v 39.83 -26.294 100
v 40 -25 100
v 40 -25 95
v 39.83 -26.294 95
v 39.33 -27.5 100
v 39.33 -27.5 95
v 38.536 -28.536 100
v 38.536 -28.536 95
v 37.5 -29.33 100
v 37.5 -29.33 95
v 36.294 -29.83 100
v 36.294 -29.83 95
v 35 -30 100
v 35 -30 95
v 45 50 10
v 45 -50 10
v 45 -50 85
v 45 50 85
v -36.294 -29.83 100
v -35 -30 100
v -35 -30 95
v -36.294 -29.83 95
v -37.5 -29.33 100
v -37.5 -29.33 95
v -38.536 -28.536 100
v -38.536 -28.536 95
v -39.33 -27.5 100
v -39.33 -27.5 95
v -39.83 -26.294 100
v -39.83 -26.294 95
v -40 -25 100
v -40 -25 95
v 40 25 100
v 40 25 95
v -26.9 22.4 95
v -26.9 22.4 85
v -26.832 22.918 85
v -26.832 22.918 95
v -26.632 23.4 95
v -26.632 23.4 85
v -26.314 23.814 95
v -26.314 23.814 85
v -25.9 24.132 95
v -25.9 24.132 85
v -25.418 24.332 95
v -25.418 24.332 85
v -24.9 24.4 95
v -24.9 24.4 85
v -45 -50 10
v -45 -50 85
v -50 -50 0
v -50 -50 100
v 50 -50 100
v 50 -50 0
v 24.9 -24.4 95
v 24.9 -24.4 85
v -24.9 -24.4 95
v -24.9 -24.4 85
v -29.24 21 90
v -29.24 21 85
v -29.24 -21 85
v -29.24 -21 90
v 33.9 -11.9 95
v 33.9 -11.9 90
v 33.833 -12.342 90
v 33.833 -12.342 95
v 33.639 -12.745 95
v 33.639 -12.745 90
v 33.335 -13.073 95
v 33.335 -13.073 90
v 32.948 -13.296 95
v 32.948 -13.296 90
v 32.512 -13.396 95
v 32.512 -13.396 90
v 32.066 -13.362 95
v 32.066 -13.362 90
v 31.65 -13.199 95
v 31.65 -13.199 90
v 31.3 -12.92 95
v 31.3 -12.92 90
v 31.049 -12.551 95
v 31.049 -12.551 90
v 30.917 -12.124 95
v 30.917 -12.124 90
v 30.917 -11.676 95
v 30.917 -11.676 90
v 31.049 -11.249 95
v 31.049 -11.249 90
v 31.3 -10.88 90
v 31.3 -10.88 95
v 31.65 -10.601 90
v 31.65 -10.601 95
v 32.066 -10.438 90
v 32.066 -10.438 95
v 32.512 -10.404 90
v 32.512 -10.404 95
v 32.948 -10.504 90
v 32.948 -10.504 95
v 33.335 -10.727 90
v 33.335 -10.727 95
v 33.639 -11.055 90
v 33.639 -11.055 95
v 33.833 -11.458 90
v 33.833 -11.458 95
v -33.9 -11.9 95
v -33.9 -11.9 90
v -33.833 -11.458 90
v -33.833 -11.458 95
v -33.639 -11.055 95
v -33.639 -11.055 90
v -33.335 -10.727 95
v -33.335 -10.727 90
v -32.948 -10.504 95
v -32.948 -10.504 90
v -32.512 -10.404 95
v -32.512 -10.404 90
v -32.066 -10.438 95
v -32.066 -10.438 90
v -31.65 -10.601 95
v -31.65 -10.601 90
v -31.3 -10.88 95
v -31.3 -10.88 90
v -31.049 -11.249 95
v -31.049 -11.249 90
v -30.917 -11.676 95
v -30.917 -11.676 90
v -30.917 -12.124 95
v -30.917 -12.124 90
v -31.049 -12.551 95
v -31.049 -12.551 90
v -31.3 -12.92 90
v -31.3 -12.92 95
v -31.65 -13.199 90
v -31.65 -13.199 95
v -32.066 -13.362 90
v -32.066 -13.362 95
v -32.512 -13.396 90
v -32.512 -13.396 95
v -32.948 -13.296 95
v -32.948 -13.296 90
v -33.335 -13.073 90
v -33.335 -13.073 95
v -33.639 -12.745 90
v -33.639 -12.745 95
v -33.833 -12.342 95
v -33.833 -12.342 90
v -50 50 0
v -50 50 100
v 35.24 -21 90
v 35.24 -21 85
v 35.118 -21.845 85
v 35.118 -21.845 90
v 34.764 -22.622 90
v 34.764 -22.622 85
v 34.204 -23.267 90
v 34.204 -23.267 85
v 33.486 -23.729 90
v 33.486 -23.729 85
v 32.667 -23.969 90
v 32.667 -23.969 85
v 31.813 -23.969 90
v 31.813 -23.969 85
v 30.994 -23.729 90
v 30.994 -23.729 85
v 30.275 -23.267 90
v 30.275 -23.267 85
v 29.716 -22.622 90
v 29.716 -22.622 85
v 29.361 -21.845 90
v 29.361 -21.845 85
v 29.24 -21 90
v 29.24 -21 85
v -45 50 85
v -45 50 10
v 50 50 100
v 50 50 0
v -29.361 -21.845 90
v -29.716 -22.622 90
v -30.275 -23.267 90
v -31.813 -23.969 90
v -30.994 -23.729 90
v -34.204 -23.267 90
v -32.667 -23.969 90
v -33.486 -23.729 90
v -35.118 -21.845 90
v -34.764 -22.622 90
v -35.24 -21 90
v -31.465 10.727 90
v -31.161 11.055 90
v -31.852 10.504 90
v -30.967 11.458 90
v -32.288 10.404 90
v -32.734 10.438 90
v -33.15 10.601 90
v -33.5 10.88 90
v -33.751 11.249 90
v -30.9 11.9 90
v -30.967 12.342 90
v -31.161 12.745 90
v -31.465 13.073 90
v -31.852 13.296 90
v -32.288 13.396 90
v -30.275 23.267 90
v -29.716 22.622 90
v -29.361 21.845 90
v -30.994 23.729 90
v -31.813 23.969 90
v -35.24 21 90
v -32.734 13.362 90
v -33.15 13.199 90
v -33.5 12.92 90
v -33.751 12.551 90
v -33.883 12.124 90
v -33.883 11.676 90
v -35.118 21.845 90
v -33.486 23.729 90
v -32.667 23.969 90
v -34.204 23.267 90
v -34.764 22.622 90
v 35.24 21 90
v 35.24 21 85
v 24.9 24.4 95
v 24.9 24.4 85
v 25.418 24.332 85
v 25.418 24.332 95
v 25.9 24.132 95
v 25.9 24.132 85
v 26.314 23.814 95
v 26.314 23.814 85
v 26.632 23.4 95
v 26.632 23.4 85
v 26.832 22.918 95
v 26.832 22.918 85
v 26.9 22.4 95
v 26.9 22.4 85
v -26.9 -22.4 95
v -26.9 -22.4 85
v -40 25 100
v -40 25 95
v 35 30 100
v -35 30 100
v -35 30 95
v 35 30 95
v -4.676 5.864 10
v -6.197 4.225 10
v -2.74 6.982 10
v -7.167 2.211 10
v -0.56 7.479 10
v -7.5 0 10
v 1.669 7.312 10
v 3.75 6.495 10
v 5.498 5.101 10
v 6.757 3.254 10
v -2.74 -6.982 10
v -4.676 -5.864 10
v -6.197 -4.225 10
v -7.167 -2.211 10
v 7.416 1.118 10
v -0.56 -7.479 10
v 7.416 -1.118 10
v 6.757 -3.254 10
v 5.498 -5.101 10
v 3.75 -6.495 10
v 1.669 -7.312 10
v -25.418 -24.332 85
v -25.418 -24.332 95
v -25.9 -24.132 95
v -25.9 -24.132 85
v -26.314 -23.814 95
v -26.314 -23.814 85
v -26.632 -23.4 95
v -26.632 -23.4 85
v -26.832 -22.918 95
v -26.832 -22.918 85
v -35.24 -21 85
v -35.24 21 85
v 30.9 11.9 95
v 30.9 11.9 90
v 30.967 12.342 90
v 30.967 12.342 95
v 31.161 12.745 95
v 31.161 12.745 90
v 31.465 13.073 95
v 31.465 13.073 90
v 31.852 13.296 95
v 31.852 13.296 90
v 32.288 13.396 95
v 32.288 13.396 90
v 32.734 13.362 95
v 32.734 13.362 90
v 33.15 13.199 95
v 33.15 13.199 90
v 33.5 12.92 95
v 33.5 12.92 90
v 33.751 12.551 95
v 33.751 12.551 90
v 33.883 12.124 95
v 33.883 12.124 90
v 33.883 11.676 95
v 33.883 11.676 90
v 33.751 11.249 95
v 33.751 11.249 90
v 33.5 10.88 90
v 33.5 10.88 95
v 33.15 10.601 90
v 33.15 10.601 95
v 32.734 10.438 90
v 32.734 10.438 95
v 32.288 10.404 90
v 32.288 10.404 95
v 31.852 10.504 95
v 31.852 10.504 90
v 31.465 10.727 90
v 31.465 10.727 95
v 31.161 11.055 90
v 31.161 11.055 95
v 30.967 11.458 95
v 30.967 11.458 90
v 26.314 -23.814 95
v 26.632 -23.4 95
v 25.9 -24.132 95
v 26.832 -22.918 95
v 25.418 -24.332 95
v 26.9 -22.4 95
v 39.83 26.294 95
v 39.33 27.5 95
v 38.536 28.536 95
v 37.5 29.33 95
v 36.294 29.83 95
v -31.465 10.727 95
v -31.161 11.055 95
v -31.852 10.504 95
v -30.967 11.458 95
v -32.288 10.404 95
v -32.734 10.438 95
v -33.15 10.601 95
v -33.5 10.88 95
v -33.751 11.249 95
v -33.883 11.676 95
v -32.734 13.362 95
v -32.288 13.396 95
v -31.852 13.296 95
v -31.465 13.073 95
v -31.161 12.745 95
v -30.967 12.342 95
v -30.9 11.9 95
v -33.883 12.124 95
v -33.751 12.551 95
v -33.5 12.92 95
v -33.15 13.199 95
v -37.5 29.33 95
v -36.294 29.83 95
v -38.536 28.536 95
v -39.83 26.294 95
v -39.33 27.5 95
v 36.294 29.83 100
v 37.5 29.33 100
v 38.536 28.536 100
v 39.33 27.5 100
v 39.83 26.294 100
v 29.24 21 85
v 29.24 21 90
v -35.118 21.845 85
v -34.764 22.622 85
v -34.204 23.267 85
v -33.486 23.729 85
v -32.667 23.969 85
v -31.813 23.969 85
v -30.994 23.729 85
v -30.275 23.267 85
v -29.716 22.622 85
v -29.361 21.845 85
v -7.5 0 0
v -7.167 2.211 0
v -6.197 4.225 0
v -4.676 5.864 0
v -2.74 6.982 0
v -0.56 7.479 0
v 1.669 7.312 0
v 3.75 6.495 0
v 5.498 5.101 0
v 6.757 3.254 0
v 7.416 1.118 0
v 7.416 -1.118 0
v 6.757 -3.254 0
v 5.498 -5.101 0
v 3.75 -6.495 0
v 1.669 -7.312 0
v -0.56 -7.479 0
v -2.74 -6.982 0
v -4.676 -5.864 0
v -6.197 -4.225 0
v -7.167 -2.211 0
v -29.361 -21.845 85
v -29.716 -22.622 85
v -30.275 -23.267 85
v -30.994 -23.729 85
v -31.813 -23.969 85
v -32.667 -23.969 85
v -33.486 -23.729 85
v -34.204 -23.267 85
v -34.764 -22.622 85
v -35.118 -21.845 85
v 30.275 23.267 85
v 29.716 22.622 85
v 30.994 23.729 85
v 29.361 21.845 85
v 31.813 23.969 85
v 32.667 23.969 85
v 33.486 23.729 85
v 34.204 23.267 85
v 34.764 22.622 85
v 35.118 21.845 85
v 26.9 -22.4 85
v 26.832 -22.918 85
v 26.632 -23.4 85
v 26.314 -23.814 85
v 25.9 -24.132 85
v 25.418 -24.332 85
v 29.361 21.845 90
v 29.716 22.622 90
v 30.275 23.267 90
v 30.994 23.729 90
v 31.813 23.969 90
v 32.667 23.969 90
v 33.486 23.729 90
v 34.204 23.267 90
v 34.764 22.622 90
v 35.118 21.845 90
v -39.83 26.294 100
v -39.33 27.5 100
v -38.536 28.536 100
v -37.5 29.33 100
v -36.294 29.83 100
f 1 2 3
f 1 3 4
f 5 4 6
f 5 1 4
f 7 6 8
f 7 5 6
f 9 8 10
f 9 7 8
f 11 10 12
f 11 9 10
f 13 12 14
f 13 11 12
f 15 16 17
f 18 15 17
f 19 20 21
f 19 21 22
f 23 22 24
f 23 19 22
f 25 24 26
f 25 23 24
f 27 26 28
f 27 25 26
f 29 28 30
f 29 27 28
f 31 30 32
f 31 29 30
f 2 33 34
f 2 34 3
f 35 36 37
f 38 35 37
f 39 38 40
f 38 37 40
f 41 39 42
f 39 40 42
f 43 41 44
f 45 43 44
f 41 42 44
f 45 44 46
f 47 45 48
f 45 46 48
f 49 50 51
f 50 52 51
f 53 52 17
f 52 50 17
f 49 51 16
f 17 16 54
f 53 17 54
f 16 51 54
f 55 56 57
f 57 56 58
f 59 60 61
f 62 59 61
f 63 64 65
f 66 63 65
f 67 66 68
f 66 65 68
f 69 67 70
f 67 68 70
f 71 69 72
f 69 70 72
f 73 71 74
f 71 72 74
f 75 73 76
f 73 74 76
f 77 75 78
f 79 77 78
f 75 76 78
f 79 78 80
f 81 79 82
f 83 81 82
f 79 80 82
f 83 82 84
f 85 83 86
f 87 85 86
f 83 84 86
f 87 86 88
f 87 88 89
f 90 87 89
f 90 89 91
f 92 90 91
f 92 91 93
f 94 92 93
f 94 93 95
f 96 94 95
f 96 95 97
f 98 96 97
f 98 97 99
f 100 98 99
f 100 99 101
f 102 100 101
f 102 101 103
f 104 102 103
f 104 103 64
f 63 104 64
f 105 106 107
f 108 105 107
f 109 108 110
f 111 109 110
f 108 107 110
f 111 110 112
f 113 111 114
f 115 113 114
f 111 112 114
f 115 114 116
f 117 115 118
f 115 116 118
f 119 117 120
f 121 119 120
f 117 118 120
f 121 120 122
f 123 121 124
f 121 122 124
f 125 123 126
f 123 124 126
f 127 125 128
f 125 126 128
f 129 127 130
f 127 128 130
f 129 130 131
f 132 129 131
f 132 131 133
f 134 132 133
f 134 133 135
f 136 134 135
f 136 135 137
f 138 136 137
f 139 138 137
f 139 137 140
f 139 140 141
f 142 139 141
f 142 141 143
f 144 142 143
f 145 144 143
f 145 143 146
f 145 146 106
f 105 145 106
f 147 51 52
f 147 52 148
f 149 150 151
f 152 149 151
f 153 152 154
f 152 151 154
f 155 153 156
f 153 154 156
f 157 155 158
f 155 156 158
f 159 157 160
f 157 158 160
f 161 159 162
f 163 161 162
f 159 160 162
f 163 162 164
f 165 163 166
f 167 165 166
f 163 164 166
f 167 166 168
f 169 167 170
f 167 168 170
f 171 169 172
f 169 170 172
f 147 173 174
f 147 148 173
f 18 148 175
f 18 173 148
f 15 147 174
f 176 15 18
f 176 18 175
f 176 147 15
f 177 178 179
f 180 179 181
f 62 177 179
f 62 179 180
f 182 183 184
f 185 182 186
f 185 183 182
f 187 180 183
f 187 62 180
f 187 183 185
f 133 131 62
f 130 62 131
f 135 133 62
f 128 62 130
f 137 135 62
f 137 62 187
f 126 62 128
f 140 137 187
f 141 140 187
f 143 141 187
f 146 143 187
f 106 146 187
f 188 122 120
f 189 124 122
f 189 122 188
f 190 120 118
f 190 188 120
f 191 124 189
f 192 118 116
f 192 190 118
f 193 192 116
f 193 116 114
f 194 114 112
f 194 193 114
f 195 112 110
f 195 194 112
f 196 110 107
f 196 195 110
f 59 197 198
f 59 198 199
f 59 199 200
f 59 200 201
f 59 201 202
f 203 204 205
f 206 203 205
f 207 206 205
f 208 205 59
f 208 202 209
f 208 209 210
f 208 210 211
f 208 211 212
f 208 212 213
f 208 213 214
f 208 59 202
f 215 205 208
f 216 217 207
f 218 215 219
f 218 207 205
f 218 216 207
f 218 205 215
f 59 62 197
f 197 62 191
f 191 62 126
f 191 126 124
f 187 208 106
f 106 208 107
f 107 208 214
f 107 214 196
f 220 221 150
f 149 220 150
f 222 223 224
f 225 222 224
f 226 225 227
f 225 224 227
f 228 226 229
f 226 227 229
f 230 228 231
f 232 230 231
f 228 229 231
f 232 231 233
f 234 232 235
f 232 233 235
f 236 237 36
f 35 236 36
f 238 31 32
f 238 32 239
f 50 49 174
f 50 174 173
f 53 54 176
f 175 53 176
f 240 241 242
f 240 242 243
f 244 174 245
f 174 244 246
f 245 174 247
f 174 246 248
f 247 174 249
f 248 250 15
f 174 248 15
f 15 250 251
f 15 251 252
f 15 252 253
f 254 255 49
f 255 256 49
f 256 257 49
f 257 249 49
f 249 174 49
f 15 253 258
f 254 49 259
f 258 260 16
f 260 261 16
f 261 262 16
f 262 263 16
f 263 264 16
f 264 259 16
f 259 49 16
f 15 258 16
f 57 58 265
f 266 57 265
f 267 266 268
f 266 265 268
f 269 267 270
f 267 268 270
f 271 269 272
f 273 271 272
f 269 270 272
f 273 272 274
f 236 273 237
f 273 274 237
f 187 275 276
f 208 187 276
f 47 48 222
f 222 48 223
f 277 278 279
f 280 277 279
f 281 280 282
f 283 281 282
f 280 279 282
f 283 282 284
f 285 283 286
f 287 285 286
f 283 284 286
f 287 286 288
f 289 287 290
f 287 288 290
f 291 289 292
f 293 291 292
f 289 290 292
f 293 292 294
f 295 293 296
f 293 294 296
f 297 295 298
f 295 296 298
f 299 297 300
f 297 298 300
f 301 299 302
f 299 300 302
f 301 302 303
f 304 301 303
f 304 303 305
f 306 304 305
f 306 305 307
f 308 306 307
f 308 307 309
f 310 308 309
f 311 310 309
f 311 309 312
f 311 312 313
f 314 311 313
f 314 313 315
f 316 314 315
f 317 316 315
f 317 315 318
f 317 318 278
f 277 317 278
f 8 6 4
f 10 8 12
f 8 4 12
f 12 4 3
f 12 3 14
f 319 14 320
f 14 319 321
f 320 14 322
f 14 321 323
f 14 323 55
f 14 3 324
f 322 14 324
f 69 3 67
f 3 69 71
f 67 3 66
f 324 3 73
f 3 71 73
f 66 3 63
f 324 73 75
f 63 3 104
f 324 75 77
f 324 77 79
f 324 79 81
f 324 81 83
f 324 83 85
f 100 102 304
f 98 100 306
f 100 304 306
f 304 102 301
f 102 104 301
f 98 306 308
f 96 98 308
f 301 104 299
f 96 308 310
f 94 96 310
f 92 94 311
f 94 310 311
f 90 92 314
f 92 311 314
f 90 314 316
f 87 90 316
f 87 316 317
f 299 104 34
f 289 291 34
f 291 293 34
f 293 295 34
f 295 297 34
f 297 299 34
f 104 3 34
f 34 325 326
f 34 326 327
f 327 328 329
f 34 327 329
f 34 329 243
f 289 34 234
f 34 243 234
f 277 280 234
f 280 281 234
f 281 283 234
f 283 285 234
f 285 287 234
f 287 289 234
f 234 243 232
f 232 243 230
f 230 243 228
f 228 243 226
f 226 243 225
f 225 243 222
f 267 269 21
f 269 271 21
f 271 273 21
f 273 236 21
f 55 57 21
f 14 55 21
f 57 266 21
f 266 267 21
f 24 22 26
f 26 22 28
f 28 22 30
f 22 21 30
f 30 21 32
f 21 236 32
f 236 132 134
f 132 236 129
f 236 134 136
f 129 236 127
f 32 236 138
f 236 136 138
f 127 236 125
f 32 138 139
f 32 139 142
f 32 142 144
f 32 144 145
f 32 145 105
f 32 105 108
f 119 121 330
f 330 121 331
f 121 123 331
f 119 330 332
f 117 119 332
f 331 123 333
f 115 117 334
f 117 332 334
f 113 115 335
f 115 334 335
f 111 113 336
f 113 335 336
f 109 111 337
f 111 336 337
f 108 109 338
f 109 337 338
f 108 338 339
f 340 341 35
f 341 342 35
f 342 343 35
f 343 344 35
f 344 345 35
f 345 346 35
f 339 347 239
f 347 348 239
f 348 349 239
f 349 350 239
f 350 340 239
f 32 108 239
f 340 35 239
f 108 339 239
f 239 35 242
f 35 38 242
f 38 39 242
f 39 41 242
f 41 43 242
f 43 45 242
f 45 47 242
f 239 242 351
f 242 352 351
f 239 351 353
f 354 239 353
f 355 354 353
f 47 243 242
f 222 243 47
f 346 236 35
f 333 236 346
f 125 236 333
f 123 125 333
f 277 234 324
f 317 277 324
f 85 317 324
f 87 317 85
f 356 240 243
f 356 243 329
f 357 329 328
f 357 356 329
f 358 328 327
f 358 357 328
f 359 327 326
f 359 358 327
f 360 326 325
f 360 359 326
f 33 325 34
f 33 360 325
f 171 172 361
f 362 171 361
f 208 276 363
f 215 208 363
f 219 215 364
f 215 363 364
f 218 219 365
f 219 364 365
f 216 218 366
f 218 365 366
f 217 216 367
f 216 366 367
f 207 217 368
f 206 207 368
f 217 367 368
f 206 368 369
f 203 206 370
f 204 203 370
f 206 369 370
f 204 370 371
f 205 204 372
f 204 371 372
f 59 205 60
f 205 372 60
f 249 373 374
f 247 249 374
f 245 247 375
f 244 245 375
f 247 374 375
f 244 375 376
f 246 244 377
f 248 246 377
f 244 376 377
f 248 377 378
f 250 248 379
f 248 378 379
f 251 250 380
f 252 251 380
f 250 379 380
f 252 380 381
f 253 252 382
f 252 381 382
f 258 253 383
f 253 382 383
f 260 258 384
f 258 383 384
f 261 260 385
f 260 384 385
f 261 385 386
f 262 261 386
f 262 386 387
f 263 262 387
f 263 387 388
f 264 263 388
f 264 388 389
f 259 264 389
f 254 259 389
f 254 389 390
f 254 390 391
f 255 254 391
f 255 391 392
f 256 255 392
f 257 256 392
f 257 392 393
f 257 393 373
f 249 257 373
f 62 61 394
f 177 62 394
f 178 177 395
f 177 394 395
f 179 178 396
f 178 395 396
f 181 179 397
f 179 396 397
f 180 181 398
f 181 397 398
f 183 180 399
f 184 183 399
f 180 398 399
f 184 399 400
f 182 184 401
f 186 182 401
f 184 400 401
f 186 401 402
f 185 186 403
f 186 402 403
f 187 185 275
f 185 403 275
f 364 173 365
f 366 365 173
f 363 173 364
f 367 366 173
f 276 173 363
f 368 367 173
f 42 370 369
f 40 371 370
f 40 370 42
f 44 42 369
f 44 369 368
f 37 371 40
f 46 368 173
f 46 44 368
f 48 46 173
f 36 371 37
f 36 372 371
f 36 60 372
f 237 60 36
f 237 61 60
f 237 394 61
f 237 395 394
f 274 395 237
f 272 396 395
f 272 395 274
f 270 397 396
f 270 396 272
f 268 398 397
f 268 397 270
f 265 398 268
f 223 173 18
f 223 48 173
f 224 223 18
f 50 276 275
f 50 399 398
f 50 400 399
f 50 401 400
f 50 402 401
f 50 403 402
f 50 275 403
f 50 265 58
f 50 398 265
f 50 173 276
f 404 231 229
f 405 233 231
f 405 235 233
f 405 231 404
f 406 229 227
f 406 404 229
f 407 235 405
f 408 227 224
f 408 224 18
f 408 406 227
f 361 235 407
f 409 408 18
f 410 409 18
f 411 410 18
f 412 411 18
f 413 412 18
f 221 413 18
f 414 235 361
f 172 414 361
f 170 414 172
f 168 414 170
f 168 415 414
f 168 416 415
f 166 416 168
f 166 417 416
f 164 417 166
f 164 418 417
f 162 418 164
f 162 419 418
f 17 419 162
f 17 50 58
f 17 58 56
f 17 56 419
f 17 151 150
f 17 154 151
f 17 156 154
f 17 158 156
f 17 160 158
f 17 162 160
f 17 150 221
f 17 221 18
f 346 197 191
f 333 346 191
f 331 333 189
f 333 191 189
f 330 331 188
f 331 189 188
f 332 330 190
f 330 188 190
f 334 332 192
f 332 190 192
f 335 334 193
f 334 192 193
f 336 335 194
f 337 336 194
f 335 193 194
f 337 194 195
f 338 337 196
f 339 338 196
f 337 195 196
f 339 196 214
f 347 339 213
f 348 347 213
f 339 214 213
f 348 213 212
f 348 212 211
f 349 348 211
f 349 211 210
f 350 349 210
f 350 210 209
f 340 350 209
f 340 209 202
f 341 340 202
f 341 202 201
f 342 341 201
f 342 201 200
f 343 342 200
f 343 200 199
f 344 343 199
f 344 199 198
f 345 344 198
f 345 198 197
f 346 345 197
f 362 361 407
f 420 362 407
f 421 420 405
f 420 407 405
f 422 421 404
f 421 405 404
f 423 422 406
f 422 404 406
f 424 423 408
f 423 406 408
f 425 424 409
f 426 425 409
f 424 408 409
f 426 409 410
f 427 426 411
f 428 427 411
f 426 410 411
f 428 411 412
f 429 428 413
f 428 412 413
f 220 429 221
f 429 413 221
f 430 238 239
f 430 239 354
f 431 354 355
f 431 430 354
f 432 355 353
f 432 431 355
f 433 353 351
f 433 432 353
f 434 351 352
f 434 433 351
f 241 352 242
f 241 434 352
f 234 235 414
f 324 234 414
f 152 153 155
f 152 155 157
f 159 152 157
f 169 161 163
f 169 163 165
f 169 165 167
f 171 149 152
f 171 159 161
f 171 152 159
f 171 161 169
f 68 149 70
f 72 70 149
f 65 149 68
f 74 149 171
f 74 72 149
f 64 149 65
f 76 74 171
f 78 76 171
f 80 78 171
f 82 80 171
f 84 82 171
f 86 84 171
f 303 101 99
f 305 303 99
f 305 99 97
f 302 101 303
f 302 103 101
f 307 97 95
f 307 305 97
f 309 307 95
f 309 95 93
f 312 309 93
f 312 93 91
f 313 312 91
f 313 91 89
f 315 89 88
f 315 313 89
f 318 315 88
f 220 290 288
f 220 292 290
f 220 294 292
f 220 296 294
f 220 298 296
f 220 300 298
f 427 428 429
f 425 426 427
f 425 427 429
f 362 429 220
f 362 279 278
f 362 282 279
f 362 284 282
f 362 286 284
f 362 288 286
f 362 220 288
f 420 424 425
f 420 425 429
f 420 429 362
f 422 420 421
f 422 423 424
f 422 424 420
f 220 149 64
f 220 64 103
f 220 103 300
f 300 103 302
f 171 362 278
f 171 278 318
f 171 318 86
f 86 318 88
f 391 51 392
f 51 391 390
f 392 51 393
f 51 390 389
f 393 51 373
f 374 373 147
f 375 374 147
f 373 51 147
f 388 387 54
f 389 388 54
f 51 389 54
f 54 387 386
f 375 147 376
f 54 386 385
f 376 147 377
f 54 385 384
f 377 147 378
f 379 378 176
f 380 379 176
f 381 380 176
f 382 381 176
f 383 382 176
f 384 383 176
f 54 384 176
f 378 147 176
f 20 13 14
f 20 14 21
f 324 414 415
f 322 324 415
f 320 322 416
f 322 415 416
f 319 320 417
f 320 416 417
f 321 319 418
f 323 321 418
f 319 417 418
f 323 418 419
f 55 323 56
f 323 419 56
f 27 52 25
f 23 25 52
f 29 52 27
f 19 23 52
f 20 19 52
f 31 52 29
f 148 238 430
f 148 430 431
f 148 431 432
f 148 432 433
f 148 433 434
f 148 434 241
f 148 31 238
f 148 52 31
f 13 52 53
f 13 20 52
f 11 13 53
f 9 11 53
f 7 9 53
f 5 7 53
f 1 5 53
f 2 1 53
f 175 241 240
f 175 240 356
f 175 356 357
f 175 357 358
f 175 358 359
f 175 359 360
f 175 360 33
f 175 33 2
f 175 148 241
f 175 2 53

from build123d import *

# Parameters (mm, degrees)
SKETCH_1_W          = 100
SKETCH_1_H          = 100
EXTRUDE_1_DEPTH     = 100
SKETCH_2_W          = 90
SKETCH_2_H          = 75
CUT_EXTRUDE_1_DEPTH = 151
CUT_EXTRUDE_2_REACH = 124.474
SKETCH_3_R          = 7.5
CUT_EXTRUDE_3_REACH = 112.567
SKETCH_4_R          = 1.5
CUT_EXTRUDE_4_DEPTH = 5
SKETCH_6_R          = 1.5
CUT_EXTRUDE_5_DEPTH = 5


with BuildPart() as part:
    # 草圖1 → 填料-伸長1 (new body)
    with BuildSketch(Plane.XY):
        Rectangle(SKETCH_1_W, SKETCH_1_H)
    extrude(amount=EXTRUDE_1_DEPTH)

    # 草圖2 → 除料-伸長1 (cut, through all)
    with BuildSketch(Plane.XZ.offset(50)):
        with Locations((0, 47.5)):
            Rectangle(SKETCH_2_W, SKETCH_2_H)
    extrude(amount=-CUT_EXTRUDE_1_DEPTH, mode=Mode.SUBTRACT)

    # 草圖3 → 除料-伸長2 (cut, up to next)
    with BuildSketch(Plane(origin=(0, 0, 0), x_dir=(-1, 0, 0), z_dir=(0, 0, -1)), mode=Mode.PRIVATE) as cut_extrude_2_sk1:
        Circle(SKETCH_3_R)
    cut_extrude_2_tool1 = extrude(cut_extrude_2_sk1.sketch, amount=-CUT_EXTRUDE_2_REACH, mode=Mode.PRIVATE) & part.part
    add(cut_extrude_2_tool1.solids().sort_by_distance((0, 0, 0))[0], mode=Mode.SUBTRACT)

    # 草圖4 → 除料-伸長3 (cut, up to next)
    with BuildSketch(Plane(origin=(0, 0, 85), x_dir=(-1, 0, 0), z_dir=(0, 0, -1)), mode=Mode.PRIVATE) as cut_extrude_3_sk1:
        with Locations((-32.4, 11.9)):
            Circle(SKETCH_4_R)
    cut_extrude_3_tool1 = extrude(cut_extrude_3_sk1.sketch, amount=-CUT_EXTRUDE_3_REACH, mode=Mode.PRIVATE) & part.part
    # 草圖4 → 除料-伸長3 (cut, up to next)
    with BuildSketch(Plane(origin=(0, 0, 85), x_dir=(-1, 0, 0), z_dir=(0, 0, -1)), mode=Mode.PRIVATE) as cut_extrude_3_sk2:
        with Locations(Location((32.4, 11.9, 0), (0, 0, 180))):
            Circle(SKETCH_4_R)
    cut_extrude_3_tool2 = extrude(cut_extrude_3_sk2.sketch, amount=-CUT_EXTRUDE_3_REACH, mode=Mode.PRIVATE) & part.part
    # 草圖4 → 除料-伸長3 (cut, up to next)
    with BuildSketch(Plane(origin=(0, 0, 85), x_dir=(-1, 0, 0), z_dir=(0, 0, -1)), mode=Mode.PRIVATE) as cut_extrude_3_sk3:
        with Locations((32.4, -11.9)):
            Circle(SKETCH_4_R)
    cut_extrude_3_tool3 = extrude(cut_extrude_3_sk3.sketch, amount=-CUT_EXTRUDE_3_REACH, mode=Mode.PRIVATE) & part.part
    # 草圖4 → 除料-伸長3 (cut, up to next)
    with BuildSketch(Plane(origin=(0, 0, 85), x_dir=(-1, 0, 0), z_dir=(0, 0, -1)), mode=Mode.PRIVATE) as cut_extrude_3_sk4:
        with Locations(Location((-32.4, -11.9, 0), (0, 0, 180))):
            Circle(SKETCH_4_R)
    cut_extrude_3_tool4 = extrude(cut_extrude_3_sk4.sketch, amount=-CUT_EXTRUDE_3_REACH, mode=Mode.PRIVATE) & part.part
    # 草圖4 → 除料-伸長3 (cut, up to next)
    with BuildSketch(Plane(origin=(0, 0, 85), x_dir=(-1, 0, 0), z_dir=(0, 0, -1)), mode=Mode.PRIVATE) as cut_extrude_3_sk5:
        with BuildLine():
            Line((24.9, 24.4), (-24.9, 24.4))
            ThreePointArc((-24.9, 24.4), (-26.314213562, 23.814213562), (-26.9, 22.4))
            Line((-26.9, 22.4), (-26.9, -22.4))
            ThreePointArc((-26.9, -22.4), (-26.314213562, -23.814213562), (-24.9, -24.4))
            Line((-24.9, -24.4), (24.9, -24.4))
            ThreePointArc((24.9, -24.4), (26.314213562, -23.814213562), (26.9, -22.4))
            Line((26.9, -22.4), (26.9, 22.4))
            ThreePointArc((26.9, 22.4), (26.314213562, 23.814213562), (24.9, 24.4))
        make_face()
    cut_extrude_3_tool5 = extrude(cut_extrude_3_sk5.sketch, amount=-CUT_EXTRUDE_3_REACH, mode=Mode.PRIVATE) & part.part
    add(cut_extrude_3_tool1.solids().sort_by_distance((32.4, 11.9, 85))[0], mode=Mode.SUBTRACT)
    add(cut_extrude_3_tool2.solids().sort_by_distance((-32.4, 11.9, 85))[0], mode=Mode.SUBTRACT)
    add(cut_extrude_3_tool3.solids().sort_by_distance((-32.4, -11.9, 85))[0], mode=Mode.SUBTRACT)
    add(cut_extrude_3_tool4.solids().sort_by_distance((32.4, -11.9, 85))[0], mode=Mode.SUBTRACT)
    add(cut_extrude_3_tool5.solids().sort_by_distance((0, 0, 85))[0], mode=Mode.SUBTRACT)

    # 草圖5 → 除料-伸長4 (cut)
    with BuildSketch(Plane.XY.offset(100)):
        with BuildLine():
            Line((-35, 30), (35, 30))
            ThreePointArc((35, 30), (38.535533906, 28.535533906), (40, 25))
            Line((40, 25), (40, -25))
            ThreePointArc((40, -25), (38.535533906, -28.535533906), (35, -30))
            Line((35, -30), (-35, -30))
            ThreePointArc((-35, -30), (-38.535533906, -28.535533906), (-40, -25))
            Line((-40, -25), (-40, 25))
            ThreePointArc((-40, 25), (-38.535533906, 28.535533906), (-35, 30))
        make_face()
    extrude(amount=-CUT_EXTRUDE_4_DEPTH, mode=Mode.SUBTRACT)

    # 草圖6 → 除料-伸長5 (cut)
    # profile 1 of 18: a face of its own
    with BuildSketch(Plane(origin=(0, 0, 85), x_dir=(-1, 0, 0), z_dir=(0, 0, -1))):
        with BuildLine():
            ThreePointArc((-29.239866432, 21), (-32.239866432, 24), (-35.239866432, 21))
            Line((-35.239866432, 21), (-29.239866432, 21))
        make_face()
    # profile 2 of 18: a face of its own
    with BuildSketch(Plane(origin=(0, 0, 85), x_dir=(-1, 0, 0), z_dir=(0, 0, -1))):
        with BuildLine():
            Line((-29.239866432, 21), (-35.239866432, 21))
            ThreePointArc((-35.239866432, 21), (-32.239866432, 18), (-29.239866432, 21))
        make_face()
    # profile 3 of 18: a face of its own
    with BuildSketch(Plane(origin=(0, 0, 85), x_dir=(-1, 0, 0), z_dir=(0, 0, -1))):
        with BuildLine():
            ThreePointArc((-29.239866432, 21), (-32.239866432, 24), (-35.239866432, 21))
            Line((-35.239866432, 21), (-29.239866432, 21))
        make_face()
    # profile 4 of 18: a face of its own
    with BuildSketch(Plane(origin=(0, 0, 85), x_dir=(-1, 0, 0), z_dir=(0, 0, -1))):
        with BuildLine():
            Line((-29.239866432, 21), (-35.239866432, 21))
            ThreePointArc((-35.239866432, 21), (-32.239866432, 18), (-29.239866432, 21))
        make_face()
    # profile 5 of 18: a face of its own
    with BuildSketch(Plane(origin=(0, 0, 85), x_dir=(-1, 0, 0), z_dir=(0, 0, -1))):
        with BuildLine():
            ThreePointArc((-29.239866432, 21), (-32.239866432, 18), (-35.239866432, 21))
            Line((-35.239866432, 21), (-35.239866432, -21))
            ThreePointArc((-35.239866432, -21), (-32.239866432, -18), (-29.239866432, -21))
            Line((-29.239866432, -21), (-29.239866432, 21))
        make_face()
        with Locations((-32.4, -11.9)):
            Circle(SKETCH_6_R, mode=Mode.SUBTRACT)
        with Locations((-32.4, 11.9)):
            Circle(SKETCH_6_R, mode=Mode.SUBTRACT)
    # profile 6 of 18: a face of its own
    with BuildSketch(Plane(origin=(0, 0, 85), x_dir=(-1, 0, 0), z_dir=(0, 0, -1))):
        with BuildLine():
            ThreePointArc((-29.239866432, -21), (-32.239866432, -18), (-35.239866432, -21))
            Line((-35.239866432, -21), (-29.239866432, -21))
        make_face()
    # profile 7 of 18: a face of its own
    with BuildSketch(Plane(origin=(0, 0, 85), x_dir=(-1, 0, 0), z_dir=(0, 0, -1))):
        with BuildLine():
            Line((-29.239866432, -21), (-35.239866432, -21))
            ThreePointArc((-35.239866432, -21), (-32.239866432, -24), (-29.239866432, -21))
        make_face()
    # profile 8 of 18: a face of its own
    with BuildSketch(Plane(origin=(0, 0, 85), x_dir=(-1, 0, 0), z_dir=(0, 0, -1))):
        with BuildLine():
            ThreePointArc((-29.239866432, -21), (-32.239866432, -18), (-35.239866432, -21))
            Line((-35.239866432, -21), (-29.239866432, -21))
        make_face()
    # profile 9 of 18: a face of its own
    with BuildSketch(Plane(origin=(0, 0, 85), x_dir=(-1, 0, 0), z_dir=(0, 0, -1))):
        with BuildLine():
            Line((-29.239866432, -21), (-35.239866432, -21))
            ThreePointArc((-35.239866432, -21), (-32.239866432, -24), (-29.239866432, -21))
        make_face()
    # profile 10 of 18: a face of its own
    with BuildSketch(Plane(origin=(0, 0, 85), x_dir=(-1, 0, 0), z_dir=(0, 0, -1))):
        with BuildLine():
            ThreePointArc((29.239866432, 21), (32.239866432, 18), (35.239866432, 21))
            Line((35.239866432, 21), (29.239866432, 21))
        make_face()
    # profile 11 of 18: a face of its own
    with BuildSketch(Plane(origin=(0, 0, 85), x_dir=(-1, 0, 0), z_dir=(0, 0, -1))):
        with BuildLine():
            Line((29.239866432, 21), (35.239866432, 21))
            ThreePointArc((35.239866432, 21), (32.239866432, 24), (29.239866432, 21))
        make_face()
    # profile 12 of 18: a face of its own
    with BuildSketch(Plane(origin=(0, 0, 85), x_dir=(-1, 0, 0), z_dir=(0, 0, -1))):
        with BuildLine():
            ThreePointArc((29.239866432, 21), (32.239866432, 18), (35.239866432, 21))
            Line((35.239866432, 21), (29.239866432, 21))
        make_face()
    # profile 13 of 18: a face of its own
    with BuildSketch(Plane(origin=(0, 0, 85), x_dir=(-1, 0, 0), z_dir=(0, 0, -1))):
        with BuildLine():
            Line((29.239866432, 21), (35.239866432, 21))
            ThreePointArc((35.239866432, 21), (32.239866432, 24), (29.239866432, 21))
        make_face()
    # profile 14 of 18: a face of its own
    with BuildSketch(Plane(origin=(0, 0, 85), x_dir=(-1, 0, 0), z_dir=(0, 0, -1))):
        with BuildLine():
            ThreePointArc((29.239866432, -21), (32.239866432, -18), (35.239866432, -21))
            Line((35.239866432, -21), (35.239866432, 21))
            ThreePointArc((35.239866432, 21), (32.239866432, 18), (29.239866432, 21))
            Line((29.239866432, 21), (29.239866432, -21))
        make_face()
        with Locations((32.4, -11.9)):
            Circle(SKETCH_6_R, mode=Mode.SUBTRACT)
        with Locations((32.4, 11.9)):
            Circle(SKETCH_6_R, mode=Mode.SUBTRACT)
    # profile 15 of 18: a face of its own
    with BuildSketch(Plane(origin=(0, 0, 85), x_dir=(-1, 0, 0), z_dir=(0, 0, -1))):
        with BuildLine():
            ThreePointArc((29.239866432, -21), (32.239866432, -24), (35.239866432, -21))
            Line((35.239866432, -21), (29.239866432, -21))
        make_face()
    # profile 16 of 18: a face of its own
    with BuildSketch(Plane(origin=(0, 0, 85), x_dir=(-1, 0, 0), z_dir=(0, 0, -1))):
        with BuildLine():
            Line((29.239866432, -21), (35.239866432, -21))
            ThreePointArc((35.239866432, -21), (32.239866432, -18), (29.239866432, -21))
        make_face()
    # profile 17 of 18: a face of its own
    with BuildSketch(Plane(origin=(0, 0, 85), x_dir=(-1, 0, 0), z_dir=(0, 0, -1))):
        with BuildLine():
            ThreePointArc((29.239866432, -21), (32.239866432, -24), (35.239866432, -21))
            Line((35.239866432, -21), (29.239866432, -21))
        make_face()
    # profile 18 of 18: a face of its own
    with BuildSketch(Plane(origin=(0, 0, 85), x_dir=(-1, 0, 0), z_dir=(0, 0, -1))):
        with BuildLine():
            Line((29.239866432, -21), (35.239866432, -21))
            ThreePointArc((35.239866432, -21), (32.239866432, -18), (29.239866432, -21))
        make_face()
    extrude(amount=-CUT_EXTRUDE_5_DEPTH, mode=Mode.SUBTRACT)


solid = part.part
